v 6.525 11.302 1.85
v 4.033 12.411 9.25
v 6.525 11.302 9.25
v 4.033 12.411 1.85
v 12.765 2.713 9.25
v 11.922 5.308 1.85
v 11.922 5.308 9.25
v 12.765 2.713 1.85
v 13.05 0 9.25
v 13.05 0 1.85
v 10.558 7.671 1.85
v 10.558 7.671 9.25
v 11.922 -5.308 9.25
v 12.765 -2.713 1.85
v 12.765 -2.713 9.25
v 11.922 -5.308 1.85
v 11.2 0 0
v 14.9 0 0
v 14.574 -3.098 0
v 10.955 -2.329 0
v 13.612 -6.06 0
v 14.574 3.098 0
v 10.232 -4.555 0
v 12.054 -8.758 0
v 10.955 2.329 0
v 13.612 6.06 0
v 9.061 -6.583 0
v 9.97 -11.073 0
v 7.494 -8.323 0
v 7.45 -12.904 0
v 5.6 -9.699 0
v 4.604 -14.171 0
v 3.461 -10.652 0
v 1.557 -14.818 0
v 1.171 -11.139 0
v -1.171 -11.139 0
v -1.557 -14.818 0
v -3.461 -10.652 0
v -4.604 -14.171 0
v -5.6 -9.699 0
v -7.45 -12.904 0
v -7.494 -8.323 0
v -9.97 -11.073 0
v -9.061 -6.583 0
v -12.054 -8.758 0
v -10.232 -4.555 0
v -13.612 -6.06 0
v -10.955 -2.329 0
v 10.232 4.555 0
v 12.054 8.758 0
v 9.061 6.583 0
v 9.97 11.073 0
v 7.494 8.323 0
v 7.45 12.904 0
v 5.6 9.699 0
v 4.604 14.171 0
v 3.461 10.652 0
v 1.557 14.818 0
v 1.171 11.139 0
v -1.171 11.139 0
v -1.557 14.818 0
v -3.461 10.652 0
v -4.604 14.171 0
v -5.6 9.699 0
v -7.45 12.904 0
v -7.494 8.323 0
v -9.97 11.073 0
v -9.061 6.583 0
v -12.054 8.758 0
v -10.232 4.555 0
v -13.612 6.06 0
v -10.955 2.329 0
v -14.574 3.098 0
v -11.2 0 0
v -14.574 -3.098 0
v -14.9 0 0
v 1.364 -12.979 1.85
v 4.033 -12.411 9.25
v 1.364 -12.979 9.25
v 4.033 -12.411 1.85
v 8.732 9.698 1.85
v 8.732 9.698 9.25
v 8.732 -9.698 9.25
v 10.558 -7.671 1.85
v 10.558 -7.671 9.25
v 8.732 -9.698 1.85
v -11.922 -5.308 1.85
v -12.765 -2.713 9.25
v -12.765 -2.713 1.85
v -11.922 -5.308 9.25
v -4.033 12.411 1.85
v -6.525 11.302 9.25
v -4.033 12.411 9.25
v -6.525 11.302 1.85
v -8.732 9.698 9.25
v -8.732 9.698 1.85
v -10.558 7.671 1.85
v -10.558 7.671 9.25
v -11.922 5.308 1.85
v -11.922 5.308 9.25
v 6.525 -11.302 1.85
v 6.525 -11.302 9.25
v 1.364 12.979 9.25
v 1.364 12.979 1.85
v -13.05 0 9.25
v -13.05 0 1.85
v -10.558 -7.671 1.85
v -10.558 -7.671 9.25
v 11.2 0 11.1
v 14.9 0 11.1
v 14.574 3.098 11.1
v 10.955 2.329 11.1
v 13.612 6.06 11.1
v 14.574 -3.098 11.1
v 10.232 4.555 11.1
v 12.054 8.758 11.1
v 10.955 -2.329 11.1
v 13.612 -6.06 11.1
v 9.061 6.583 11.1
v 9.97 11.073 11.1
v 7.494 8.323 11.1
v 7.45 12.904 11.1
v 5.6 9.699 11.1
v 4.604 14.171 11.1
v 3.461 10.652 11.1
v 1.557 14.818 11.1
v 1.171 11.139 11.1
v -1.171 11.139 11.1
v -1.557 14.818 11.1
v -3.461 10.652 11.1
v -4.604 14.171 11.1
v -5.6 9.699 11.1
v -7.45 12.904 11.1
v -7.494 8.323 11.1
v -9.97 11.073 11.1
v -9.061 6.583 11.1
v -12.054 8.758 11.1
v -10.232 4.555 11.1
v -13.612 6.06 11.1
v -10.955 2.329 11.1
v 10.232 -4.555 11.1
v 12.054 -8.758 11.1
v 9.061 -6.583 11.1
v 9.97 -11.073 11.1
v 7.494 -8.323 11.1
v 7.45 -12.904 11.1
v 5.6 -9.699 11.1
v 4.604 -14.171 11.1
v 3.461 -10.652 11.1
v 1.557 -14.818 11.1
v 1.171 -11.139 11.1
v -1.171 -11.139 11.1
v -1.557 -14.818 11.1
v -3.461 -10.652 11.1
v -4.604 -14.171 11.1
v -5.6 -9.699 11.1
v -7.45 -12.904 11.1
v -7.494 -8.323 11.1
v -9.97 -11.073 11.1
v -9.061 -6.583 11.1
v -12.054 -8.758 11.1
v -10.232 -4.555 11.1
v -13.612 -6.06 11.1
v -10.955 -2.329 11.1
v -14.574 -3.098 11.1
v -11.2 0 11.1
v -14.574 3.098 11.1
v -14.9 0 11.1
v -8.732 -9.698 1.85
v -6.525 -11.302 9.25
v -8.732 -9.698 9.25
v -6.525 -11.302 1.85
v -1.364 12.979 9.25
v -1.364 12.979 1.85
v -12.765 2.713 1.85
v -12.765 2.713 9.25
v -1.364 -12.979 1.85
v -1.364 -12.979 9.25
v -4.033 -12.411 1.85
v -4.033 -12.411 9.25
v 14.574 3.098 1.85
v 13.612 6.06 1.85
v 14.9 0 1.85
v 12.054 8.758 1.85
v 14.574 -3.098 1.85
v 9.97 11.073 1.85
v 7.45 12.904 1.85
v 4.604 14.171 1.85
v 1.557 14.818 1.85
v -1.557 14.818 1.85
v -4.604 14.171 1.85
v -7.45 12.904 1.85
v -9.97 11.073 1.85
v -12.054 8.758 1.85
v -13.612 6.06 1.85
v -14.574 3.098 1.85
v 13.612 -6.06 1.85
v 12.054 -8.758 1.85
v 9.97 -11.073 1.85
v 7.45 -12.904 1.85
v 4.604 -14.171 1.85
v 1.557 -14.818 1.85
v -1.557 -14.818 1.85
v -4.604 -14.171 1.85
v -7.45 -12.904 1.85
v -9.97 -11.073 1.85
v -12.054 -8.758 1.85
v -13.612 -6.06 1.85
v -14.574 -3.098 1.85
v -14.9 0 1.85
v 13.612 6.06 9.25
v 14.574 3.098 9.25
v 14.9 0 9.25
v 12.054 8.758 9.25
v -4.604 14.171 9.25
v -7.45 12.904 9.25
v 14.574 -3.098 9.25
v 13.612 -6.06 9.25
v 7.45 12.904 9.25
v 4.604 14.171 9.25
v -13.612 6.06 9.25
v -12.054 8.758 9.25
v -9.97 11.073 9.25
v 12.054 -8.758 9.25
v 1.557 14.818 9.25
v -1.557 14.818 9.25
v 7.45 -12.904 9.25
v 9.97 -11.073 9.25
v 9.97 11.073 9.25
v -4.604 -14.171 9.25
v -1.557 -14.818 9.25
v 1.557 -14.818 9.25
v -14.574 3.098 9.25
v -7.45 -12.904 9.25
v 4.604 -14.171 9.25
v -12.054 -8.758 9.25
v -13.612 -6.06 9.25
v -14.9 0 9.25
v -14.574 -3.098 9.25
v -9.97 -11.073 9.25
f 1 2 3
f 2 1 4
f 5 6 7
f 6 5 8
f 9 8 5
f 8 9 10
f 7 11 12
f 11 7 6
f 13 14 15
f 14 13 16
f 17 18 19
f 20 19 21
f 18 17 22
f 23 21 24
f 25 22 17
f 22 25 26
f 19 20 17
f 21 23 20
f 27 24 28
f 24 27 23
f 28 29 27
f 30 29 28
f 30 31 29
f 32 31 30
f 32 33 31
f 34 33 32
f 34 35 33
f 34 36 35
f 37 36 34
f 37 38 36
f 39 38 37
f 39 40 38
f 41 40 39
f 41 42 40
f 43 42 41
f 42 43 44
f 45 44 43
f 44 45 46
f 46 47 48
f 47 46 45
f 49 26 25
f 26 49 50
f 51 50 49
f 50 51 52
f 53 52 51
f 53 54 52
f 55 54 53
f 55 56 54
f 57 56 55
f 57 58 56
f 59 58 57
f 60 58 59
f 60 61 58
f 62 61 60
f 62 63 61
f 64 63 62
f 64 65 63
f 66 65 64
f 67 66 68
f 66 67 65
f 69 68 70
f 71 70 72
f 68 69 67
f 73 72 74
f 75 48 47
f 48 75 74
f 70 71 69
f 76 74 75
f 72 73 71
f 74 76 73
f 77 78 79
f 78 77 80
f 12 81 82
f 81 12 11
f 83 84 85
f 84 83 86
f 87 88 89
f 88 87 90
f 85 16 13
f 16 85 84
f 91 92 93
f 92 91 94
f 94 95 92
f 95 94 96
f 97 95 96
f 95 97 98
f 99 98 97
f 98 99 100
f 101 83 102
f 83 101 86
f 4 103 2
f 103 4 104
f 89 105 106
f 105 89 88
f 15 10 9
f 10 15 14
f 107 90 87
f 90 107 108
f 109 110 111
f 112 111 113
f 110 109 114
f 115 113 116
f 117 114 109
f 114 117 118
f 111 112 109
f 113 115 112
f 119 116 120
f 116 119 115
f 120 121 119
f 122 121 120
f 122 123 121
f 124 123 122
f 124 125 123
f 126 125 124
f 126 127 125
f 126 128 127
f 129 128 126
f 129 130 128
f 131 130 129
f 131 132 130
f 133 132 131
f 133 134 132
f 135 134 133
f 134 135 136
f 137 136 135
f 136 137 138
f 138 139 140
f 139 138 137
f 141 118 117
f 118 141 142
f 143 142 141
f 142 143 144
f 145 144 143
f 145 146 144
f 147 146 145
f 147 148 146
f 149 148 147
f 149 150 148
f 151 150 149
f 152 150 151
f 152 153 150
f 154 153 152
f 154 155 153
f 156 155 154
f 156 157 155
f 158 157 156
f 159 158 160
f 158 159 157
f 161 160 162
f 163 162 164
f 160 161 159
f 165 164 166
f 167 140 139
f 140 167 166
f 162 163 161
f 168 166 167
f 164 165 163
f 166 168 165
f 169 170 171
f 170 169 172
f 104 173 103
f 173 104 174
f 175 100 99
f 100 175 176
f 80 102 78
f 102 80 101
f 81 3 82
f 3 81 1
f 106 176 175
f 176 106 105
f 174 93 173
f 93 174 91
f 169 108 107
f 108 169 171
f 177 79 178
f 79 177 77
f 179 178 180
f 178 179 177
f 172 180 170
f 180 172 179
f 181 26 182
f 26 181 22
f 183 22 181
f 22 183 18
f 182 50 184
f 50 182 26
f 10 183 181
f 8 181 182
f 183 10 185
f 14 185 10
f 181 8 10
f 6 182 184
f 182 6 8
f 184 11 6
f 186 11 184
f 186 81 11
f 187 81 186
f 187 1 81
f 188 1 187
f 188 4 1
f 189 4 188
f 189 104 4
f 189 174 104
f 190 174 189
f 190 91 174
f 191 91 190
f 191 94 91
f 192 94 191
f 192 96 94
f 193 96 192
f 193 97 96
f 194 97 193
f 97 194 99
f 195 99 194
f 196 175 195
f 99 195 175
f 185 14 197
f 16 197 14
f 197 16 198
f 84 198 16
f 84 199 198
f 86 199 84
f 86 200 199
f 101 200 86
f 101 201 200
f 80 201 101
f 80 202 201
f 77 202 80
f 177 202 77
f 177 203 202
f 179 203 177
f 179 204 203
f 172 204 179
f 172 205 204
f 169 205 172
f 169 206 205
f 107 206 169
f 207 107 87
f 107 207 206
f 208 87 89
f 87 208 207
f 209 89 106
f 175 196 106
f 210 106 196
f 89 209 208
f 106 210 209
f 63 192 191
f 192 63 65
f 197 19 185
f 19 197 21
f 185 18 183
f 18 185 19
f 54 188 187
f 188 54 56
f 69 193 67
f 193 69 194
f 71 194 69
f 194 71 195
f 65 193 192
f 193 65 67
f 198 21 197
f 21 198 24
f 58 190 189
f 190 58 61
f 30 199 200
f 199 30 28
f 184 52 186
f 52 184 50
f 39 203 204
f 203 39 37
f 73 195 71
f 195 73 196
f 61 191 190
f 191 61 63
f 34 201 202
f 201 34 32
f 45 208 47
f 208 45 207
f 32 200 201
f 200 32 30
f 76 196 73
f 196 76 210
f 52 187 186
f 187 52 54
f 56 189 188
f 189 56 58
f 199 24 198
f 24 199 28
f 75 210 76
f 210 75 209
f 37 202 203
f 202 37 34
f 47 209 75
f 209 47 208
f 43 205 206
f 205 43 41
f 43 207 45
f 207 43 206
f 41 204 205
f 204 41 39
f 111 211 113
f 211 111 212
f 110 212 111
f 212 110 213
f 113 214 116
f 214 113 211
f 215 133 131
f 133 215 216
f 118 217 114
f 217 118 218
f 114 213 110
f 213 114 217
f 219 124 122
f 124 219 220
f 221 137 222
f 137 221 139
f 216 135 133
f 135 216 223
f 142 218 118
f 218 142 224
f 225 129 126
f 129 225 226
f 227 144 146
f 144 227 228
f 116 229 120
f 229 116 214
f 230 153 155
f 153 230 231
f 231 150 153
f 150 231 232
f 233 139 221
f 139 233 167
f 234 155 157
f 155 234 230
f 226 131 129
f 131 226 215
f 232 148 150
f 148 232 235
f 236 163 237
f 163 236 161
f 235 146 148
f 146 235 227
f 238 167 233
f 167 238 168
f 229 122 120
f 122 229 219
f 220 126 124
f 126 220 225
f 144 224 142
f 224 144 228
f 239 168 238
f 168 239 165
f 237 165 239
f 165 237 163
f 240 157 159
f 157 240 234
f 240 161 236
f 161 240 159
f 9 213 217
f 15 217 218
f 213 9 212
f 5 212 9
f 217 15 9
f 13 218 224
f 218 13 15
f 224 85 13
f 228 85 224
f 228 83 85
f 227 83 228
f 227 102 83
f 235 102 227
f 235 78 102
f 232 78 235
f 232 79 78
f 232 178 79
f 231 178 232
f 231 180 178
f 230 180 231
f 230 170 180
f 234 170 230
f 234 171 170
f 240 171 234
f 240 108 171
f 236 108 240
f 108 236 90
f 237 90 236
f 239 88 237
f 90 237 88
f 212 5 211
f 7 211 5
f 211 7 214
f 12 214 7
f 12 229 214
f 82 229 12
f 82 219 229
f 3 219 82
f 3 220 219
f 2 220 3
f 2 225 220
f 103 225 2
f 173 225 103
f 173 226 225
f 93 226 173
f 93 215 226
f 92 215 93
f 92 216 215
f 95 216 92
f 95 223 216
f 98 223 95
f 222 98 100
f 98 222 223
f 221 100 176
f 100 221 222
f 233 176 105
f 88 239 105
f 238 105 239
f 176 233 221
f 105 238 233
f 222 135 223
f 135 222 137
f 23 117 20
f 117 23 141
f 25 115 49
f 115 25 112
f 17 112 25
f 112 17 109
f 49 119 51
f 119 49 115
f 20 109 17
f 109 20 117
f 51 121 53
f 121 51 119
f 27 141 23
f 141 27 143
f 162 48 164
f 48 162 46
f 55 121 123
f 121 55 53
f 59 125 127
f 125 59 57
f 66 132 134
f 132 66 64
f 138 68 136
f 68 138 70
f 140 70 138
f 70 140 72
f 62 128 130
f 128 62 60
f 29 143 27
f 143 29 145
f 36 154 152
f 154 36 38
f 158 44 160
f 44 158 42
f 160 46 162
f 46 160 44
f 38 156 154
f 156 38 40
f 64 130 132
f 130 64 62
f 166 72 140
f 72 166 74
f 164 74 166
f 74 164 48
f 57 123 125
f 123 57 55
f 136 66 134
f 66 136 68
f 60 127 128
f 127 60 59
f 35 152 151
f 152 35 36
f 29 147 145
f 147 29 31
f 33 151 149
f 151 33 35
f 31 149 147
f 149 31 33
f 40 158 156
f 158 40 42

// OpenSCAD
// file: Tolerance.scad
function LaserCutTolerance() = .02;
function 3dPrinterTolerance() = .4;
// file: Vitamins/BallBearing.scad
use <../Tolerance.scad>

function BallBearingDiam() = 22 + 3dPrinterTolerance(); //USUALLY 22
function BallBearingHeight() = 7 + 3dPrinterTolerance(); //USUALLY 7
function BallBearingInnerDiam()= 7.9 - 3dPrinterTolerance(); //USUALLY 7.9

module BallBearing()
{
cylinder(BallBearingHeight(), BallBearingDiam()/2, BallBearingDiam()/2);
}


BallBearing();
// main file
use <Vitamins/BallBearing.scad>

//when you create a not bearing dependent equivalent to plasticwidth, might want to use it here



function BearingPlasticWidth()=BallBearingHeight()/2;

module IdlerBearingClip()
{
	difference()
	{
		union()
		{
			cylinder(BallBearingHeight()+BearingPlasticWidth(), BallBearingDiam()/2+BearingPlasticWidth()/2, BallBearingDiam()/2+BearingPlasticWidth()/2);
			cylinder(BearingPlasticWidth()/2, BallBearingDiam()/2+BearingPlasticWidth(), BallBearingDiam()/2+BearingPlasticWidth());
			translate([0,0,BallBearingHeight()+BearingPlasticWidth()/2])
			{
				cylinder(BearingPlasticWidth()/2, BallBearingDiam()/2+BearingPlasticWidth(), BallBearingDiam()/2+BearingPlasticWidth());
			}
		}
	translate([0,0,-1])
	{
		cylinder(BallBearingHeight()+BearingPlasticWidth()*2+2, BallBearingDiam()/2, BallBearingDiam()/2);
	}
		
	}
}


IdlerBearingClip();
